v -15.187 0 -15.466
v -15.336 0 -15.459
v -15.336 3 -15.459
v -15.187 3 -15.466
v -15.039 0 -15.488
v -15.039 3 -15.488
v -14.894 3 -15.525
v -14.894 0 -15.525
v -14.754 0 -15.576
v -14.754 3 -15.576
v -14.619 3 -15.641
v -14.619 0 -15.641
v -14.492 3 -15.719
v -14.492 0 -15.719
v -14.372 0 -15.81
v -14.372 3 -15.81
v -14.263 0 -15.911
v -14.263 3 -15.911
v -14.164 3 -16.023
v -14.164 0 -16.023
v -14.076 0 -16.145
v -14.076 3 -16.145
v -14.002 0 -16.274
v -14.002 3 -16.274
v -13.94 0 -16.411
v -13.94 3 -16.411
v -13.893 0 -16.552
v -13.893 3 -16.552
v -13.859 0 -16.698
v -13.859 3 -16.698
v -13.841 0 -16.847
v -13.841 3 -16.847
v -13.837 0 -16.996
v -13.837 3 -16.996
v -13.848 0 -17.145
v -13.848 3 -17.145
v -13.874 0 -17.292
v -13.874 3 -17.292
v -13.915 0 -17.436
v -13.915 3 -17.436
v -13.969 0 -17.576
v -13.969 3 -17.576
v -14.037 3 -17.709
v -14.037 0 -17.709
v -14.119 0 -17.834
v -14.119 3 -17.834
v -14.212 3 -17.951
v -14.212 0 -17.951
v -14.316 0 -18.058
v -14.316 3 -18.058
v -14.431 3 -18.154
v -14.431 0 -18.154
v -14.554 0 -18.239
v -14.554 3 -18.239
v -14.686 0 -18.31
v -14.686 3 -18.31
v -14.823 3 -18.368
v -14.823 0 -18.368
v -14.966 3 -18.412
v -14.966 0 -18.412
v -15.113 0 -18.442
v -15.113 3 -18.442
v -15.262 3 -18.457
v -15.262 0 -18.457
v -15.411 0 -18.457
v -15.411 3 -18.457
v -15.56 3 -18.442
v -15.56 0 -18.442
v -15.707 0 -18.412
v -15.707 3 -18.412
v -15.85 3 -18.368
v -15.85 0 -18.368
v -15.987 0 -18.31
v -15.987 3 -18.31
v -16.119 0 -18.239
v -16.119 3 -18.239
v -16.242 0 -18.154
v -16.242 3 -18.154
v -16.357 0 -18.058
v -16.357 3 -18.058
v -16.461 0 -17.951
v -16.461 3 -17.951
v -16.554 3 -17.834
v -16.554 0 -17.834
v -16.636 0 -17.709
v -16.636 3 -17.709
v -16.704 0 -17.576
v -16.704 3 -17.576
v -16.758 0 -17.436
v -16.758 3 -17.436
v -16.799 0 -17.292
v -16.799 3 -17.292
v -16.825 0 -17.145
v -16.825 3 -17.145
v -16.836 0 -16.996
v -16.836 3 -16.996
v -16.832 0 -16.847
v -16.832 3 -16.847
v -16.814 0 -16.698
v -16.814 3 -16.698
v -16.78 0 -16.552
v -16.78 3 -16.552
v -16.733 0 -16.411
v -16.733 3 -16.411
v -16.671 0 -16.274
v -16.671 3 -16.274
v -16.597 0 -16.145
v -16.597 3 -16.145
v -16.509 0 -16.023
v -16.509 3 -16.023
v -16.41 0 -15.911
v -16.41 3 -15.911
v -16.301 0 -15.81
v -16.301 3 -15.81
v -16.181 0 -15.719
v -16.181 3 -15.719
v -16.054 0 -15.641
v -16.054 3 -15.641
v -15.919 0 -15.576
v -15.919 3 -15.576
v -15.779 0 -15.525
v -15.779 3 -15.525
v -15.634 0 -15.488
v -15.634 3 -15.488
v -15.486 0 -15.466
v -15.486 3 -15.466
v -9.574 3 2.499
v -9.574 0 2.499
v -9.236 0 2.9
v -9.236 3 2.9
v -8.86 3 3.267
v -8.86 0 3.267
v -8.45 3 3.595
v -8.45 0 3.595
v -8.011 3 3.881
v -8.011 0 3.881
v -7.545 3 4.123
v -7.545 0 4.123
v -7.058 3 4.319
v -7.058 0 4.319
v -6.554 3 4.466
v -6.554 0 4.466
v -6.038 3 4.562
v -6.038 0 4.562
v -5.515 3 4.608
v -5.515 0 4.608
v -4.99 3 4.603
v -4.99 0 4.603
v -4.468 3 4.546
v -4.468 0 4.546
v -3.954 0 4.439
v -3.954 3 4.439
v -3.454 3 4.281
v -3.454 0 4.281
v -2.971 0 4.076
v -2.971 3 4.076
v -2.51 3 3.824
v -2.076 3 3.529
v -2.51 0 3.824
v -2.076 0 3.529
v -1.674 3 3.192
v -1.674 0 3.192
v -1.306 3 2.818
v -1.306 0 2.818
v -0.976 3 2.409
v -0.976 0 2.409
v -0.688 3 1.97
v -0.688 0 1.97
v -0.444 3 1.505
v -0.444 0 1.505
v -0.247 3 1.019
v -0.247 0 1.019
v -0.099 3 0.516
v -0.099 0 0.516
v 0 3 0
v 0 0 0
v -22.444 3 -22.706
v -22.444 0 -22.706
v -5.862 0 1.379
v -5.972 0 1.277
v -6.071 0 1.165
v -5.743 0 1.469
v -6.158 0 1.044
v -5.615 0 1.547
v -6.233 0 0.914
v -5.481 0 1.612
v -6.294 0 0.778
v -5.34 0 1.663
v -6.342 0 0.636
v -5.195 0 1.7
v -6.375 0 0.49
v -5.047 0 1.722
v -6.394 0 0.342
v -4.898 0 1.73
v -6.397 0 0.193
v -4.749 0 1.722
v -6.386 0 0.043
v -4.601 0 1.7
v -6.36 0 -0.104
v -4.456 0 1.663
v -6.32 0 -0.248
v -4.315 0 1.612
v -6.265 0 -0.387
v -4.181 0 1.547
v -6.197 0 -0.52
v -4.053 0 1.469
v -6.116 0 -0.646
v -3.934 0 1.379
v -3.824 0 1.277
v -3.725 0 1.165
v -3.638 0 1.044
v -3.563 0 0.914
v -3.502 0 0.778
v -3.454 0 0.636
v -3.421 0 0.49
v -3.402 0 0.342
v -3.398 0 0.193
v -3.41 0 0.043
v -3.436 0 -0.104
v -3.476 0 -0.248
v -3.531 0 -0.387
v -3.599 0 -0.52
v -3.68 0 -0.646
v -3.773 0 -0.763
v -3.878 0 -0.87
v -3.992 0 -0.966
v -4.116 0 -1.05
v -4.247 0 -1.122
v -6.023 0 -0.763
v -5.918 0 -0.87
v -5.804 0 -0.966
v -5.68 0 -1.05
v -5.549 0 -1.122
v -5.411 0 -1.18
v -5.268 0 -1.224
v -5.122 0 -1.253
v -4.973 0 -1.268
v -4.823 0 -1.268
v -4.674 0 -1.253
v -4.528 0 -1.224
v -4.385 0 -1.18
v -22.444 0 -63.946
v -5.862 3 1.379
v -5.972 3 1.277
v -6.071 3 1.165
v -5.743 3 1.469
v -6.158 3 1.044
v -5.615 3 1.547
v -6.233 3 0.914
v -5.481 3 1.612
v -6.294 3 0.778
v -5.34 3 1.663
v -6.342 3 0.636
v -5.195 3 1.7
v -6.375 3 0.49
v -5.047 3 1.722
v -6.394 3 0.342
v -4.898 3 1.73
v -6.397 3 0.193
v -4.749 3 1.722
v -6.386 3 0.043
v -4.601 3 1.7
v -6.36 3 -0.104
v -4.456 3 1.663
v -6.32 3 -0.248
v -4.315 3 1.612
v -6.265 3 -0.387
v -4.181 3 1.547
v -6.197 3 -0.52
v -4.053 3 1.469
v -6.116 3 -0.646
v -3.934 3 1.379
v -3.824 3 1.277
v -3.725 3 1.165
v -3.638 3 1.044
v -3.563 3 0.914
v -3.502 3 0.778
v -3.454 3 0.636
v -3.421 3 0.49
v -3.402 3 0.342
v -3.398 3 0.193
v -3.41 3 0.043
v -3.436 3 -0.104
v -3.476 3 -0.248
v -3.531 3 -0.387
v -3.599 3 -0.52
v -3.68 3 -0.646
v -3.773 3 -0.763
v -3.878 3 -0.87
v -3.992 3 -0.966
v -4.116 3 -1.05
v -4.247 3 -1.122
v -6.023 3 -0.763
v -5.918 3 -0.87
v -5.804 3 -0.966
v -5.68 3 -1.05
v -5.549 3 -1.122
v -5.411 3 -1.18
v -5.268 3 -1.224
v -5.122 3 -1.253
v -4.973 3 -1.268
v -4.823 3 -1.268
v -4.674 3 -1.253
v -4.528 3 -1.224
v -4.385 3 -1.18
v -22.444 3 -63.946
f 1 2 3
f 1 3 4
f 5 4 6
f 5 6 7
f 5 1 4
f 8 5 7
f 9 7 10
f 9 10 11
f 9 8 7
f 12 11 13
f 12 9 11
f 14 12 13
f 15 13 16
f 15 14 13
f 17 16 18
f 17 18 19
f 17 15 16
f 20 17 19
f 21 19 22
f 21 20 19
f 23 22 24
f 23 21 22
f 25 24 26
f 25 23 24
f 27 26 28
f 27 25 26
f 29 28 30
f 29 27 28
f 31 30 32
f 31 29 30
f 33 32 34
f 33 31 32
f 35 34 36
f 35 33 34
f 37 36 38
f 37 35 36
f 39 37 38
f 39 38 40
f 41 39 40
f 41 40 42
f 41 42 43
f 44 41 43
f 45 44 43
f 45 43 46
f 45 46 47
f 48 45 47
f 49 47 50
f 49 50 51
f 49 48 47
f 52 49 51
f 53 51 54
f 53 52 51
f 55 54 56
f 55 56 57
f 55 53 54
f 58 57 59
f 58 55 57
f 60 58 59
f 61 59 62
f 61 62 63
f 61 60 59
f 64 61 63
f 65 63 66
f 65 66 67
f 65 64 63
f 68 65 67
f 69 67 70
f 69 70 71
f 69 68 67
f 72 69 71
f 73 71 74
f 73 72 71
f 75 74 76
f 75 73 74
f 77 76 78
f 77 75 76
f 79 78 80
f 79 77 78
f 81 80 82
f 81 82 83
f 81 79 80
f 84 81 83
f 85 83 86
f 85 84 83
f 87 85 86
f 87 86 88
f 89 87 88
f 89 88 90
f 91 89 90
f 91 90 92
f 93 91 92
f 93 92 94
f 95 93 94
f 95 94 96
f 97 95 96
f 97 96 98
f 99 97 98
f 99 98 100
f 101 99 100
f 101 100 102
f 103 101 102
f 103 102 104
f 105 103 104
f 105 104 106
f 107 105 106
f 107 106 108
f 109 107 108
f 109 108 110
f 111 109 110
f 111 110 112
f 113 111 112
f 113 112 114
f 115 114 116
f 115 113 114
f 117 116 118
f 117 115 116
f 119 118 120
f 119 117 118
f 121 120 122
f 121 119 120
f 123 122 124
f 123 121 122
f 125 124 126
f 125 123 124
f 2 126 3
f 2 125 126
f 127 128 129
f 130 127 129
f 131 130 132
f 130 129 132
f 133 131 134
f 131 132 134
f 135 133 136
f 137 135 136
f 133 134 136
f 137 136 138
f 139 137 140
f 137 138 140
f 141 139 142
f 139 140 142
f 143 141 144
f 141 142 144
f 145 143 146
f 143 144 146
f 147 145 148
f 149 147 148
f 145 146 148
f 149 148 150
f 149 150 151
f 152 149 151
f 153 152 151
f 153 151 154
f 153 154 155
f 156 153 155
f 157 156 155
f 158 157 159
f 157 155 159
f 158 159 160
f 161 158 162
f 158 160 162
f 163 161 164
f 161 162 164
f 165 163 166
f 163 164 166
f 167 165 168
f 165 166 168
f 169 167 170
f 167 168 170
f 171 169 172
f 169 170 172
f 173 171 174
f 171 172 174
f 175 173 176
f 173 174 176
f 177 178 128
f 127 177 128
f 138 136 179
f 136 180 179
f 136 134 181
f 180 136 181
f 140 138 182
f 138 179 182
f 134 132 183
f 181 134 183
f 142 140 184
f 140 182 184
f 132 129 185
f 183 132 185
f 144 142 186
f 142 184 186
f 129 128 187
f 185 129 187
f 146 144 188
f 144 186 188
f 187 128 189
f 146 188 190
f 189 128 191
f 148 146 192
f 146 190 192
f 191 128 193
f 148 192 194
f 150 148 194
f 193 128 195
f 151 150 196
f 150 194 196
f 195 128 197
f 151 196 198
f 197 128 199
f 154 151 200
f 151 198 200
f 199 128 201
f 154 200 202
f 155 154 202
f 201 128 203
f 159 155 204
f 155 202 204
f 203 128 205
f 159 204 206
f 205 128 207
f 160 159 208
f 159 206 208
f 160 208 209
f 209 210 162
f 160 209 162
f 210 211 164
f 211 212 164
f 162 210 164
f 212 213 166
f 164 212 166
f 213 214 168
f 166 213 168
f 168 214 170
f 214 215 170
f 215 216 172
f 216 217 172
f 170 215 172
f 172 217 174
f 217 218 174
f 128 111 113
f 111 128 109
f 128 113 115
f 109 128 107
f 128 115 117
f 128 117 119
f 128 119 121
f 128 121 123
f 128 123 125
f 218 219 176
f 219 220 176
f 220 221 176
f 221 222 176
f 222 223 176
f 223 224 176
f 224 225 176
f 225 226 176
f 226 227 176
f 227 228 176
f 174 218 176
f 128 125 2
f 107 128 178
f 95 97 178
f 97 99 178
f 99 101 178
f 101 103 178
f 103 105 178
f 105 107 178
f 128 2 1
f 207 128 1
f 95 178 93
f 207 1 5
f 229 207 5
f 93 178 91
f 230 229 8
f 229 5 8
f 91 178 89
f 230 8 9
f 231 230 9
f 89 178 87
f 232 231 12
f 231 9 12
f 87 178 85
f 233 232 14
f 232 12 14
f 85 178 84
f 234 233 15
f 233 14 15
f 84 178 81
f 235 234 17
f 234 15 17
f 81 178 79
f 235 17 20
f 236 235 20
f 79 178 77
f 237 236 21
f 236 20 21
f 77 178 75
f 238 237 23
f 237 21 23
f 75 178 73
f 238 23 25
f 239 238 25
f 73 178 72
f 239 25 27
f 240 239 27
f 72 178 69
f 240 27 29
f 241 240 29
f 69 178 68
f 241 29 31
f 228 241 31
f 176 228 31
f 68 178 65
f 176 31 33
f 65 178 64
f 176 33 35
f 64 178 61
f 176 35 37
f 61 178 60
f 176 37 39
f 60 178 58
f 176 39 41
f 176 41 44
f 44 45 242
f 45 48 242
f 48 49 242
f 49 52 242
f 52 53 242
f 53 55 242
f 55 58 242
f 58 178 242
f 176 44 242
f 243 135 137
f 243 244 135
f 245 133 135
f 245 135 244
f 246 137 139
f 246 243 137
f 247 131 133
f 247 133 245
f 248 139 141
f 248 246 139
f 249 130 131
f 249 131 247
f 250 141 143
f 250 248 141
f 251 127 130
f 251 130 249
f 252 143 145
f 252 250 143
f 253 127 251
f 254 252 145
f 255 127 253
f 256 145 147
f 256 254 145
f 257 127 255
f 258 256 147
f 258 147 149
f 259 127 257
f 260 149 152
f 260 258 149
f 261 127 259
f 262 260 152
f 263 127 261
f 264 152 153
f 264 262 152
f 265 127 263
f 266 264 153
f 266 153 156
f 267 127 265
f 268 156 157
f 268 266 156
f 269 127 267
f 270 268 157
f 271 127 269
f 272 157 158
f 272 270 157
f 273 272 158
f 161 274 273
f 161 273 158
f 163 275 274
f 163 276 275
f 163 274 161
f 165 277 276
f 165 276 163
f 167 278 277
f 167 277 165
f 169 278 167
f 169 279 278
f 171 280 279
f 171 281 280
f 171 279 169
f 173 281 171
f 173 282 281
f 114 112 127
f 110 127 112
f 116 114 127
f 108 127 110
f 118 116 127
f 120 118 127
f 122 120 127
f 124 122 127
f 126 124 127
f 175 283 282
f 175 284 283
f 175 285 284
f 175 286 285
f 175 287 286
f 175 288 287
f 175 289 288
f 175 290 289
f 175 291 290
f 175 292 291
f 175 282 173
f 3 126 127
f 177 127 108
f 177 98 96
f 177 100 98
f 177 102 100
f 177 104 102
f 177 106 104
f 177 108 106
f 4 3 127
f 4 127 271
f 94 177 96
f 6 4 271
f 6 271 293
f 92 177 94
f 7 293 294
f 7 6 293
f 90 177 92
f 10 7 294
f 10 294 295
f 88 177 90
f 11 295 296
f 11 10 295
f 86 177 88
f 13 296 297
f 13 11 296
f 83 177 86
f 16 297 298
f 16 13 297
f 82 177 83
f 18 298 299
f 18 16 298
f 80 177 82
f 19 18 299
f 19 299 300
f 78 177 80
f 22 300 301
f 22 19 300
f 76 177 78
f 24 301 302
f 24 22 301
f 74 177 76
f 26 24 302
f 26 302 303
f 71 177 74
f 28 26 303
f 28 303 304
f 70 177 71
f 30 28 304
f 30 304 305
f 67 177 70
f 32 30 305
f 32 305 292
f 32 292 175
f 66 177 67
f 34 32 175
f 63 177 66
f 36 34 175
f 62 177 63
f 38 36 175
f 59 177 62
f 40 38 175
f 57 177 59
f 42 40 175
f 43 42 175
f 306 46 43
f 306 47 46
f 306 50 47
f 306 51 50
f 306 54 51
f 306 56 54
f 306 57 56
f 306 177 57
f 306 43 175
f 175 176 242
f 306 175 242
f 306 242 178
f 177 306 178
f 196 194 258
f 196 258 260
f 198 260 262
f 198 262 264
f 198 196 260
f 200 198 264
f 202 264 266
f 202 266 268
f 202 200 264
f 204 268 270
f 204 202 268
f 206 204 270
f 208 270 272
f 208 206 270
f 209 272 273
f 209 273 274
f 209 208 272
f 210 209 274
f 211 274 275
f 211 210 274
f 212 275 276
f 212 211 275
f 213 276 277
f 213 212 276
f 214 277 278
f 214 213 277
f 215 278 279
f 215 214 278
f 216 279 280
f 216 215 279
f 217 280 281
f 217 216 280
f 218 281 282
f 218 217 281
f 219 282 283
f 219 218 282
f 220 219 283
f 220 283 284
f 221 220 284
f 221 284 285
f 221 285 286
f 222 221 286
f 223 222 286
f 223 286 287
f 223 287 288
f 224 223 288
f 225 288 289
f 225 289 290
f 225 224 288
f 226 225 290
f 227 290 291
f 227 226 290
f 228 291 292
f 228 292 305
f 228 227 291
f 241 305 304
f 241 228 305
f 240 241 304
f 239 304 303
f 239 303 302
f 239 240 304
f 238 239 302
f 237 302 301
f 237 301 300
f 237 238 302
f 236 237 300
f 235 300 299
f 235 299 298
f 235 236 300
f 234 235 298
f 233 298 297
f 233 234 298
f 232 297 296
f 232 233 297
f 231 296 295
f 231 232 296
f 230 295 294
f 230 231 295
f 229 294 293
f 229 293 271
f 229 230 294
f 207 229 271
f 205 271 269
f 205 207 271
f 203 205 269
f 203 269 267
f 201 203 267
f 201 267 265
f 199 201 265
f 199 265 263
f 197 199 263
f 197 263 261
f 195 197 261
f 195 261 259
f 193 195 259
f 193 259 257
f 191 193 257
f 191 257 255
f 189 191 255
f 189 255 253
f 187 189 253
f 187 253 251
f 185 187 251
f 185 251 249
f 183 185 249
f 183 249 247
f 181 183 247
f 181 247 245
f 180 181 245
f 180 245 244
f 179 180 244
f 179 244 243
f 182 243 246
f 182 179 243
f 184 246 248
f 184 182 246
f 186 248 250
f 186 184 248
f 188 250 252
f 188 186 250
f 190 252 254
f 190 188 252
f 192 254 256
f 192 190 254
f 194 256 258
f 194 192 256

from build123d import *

# Parameters (mm, degrees)
SKETCH1_R           = 1.5
BOSS_EXTRUDE1_DEPTH = 3


with BuildPart() as part:
    # Sketch1 → Boss-Extrude1 (new body)
    with BuildSketch(Plane(origin=(0, 0, 0), x_dir=(1, 0, 0), z_dir=(0, 1, 0))):
        with BuildLine():
            Line((-22.443608406, 63.945737479), (-22.443608406, 22.705737479))
            Line((-22.443608406, 22.705737479), (-9.573677497, -2.498525621))
            ThreePointArc((-9.573677497, -2.498525621), (-3.954490329, -4.438597859), (0, 0))
            Line((0, 0), (-22.443608406, 63.945737479))
        make_face()
        with Locations(Location((-15.336480405, 16.958709415, 0), (0, 0, 270))):
            Circle(SKETCH1_R, mode=Mode.SUBTRACT)
        with Locations(Location((-4.897949582, -0.229925617, 0), (0, 0, 270))):
            Circle(SKETCH1_R, mode=Mode.SUBTRACT)
    extrude(amount=BOSS_EXTRUDE1_DEPTH)


solid = part.part
